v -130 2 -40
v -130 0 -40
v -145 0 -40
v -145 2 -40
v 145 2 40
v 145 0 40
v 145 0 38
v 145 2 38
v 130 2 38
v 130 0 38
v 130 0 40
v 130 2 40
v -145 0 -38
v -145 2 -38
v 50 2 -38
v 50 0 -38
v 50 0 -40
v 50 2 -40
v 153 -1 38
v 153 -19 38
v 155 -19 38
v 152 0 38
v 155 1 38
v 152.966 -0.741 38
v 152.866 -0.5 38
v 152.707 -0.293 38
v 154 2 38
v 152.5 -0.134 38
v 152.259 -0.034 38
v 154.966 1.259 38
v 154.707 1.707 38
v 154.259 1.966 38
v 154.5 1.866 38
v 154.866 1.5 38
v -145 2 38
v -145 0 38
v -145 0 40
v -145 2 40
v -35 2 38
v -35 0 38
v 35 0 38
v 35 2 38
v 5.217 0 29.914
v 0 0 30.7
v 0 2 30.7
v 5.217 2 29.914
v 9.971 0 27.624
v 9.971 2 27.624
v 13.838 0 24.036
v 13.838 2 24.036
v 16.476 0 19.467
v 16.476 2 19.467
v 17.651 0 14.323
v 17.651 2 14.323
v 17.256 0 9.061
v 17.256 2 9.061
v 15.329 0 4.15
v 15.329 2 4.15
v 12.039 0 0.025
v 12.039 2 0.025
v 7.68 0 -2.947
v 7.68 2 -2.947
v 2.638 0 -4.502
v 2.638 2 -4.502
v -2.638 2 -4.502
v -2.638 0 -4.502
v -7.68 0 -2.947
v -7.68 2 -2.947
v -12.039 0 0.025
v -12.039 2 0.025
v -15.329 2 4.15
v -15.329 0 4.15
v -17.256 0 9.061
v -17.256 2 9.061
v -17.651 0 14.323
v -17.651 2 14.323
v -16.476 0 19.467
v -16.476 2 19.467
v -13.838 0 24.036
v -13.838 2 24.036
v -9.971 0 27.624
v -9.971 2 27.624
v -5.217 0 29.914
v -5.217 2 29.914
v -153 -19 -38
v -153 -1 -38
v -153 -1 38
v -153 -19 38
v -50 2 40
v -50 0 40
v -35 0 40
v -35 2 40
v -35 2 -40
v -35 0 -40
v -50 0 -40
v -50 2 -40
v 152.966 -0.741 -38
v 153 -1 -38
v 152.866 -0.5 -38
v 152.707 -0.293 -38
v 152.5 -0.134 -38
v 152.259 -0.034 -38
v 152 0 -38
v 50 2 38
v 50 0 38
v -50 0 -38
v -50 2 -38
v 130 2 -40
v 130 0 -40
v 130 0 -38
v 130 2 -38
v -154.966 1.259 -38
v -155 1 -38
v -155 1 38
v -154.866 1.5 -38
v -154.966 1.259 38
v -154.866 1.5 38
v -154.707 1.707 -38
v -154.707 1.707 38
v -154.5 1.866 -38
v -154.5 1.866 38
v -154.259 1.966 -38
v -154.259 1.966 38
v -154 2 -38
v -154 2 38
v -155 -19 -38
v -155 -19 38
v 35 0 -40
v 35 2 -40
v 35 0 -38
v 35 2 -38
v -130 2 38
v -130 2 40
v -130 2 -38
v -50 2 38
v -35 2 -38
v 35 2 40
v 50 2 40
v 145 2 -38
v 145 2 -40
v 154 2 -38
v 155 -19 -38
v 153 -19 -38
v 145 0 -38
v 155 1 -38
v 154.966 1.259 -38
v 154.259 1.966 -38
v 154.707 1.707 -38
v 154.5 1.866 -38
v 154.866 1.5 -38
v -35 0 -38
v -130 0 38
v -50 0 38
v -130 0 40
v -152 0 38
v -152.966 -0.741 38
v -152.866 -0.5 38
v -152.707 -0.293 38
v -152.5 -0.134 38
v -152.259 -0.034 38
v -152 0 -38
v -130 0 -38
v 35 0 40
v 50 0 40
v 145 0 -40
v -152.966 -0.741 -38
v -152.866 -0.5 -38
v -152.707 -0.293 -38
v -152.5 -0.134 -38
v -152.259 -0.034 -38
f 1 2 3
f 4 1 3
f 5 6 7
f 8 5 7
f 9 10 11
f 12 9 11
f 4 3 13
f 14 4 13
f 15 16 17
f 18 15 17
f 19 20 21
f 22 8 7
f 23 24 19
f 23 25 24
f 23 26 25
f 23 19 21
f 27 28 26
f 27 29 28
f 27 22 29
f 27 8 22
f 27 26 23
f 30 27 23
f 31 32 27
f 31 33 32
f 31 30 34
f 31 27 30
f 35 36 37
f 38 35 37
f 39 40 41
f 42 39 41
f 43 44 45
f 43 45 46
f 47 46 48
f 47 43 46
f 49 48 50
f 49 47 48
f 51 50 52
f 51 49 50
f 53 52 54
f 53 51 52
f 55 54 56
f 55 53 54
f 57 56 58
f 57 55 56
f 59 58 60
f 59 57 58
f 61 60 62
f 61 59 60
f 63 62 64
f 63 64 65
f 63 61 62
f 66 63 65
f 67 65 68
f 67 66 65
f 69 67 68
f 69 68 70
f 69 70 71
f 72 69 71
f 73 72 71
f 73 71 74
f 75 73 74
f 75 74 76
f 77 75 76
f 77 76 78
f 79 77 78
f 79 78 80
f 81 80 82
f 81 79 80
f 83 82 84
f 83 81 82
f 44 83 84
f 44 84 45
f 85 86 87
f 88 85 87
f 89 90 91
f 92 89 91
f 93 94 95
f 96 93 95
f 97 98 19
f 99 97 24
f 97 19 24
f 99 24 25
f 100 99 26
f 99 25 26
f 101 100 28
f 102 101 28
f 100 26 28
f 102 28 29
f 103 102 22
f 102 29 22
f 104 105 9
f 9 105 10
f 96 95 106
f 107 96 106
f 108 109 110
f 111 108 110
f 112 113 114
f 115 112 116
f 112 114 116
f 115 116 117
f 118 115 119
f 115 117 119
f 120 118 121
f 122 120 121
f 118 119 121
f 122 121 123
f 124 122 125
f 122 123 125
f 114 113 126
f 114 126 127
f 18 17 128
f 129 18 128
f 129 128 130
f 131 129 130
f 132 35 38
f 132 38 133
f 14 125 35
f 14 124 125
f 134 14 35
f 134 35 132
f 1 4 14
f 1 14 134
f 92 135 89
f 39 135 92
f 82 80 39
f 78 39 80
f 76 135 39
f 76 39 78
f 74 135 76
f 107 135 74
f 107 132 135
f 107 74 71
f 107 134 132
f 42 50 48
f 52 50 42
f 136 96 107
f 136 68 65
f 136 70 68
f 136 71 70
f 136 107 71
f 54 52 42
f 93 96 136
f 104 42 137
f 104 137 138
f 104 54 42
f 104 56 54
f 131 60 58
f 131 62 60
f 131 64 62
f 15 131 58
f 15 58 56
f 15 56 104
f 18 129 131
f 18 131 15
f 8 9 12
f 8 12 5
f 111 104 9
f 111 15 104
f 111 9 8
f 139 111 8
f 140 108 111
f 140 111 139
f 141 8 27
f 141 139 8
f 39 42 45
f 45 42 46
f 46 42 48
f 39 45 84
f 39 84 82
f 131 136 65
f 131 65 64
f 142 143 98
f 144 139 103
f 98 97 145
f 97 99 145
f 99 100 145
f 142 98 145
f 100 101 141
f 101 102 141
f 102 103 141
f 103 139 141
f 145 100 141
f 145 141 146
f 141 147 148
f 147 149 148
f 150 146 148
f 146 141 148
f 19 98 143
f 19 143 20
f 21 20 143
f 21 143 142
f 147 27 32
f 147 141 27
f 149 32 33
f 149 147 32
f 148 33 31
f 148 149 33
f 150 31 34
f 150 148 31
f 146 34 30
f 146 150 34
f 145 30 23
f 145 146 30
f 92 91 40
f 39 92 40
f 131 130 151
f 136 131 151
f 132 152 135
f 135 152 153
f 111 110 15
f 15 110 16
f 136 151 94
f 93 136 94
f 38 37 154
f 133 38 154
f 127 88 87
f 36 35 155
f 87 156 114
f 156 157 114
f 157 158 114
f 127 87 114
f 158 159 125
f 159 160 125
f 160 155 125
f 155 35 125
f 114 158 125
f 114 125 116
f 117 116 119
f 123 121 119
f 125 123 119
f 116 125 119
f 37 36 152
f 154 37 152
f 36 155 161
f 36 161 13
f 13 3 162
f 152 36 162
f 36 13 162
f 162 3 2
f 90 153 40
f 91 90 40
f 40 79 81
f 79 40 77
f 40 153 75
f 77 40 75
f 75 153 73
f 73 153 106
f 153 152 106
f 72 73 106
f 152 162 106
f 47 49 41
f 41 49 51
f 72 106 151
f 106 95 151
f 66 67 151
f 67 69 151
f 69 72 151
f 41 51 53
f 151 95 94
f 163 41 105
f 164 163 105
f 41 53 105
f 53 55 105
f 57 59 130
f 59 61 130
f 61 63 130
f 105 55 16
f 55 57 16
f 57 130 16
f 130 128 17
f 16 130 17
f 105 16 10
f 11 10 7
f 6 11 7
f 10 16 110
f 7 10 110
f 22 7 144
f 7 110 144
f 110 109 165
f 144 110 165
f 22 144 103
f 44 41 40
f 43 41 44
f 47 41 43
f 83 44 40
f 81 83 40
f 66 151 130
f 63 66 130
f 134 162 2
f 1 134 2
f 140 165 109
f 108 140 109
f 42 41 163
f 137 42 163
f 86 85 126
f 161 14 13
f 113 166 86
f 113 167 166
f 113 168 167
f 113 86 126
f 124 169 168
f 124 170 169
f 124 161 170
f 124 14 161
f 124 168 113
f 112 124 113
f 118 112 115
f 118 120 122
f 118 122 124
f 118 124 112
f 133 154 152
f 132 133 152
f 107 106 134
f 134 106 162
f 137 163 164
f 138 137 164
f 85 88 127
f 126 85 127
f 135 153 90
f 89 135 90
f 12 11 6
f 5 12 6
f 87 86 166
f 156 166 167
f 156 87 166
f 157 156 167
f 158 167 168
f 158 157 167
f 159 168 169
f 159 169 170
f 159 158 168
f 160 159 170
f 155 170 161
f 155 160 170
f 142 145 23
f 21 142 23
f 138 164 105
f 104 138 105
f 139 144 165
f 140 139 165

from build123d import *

# Parameters (mm, degrees)
SKETCH_1_R      = 17.7
EXTRUDE_1_DEPTH = 2
SKETCH_2_W      = 2
SKETCH_2_H      = 76
EXTRUDE_2_DEPTH = 19
FILLET_1_R      = 1


with BuildPart() as part:
    # 草图1 → 凸台-拉伸1 (new body)
    with BuildSketch(Plane(origin=(0, 0, 0), x_dir=(1, 0, 0), z_dir=(0, 1, 0))):
        Polygon((-155, -38), (-145, -38), (-145, -40), (-130, -40), (-130, -38), (-50, -38), (-50, -40), (-35, -40), (-35, -38), (35, -38), (35, -40), (50, -40), (50, -38), (130, -38), (130, -40), (145, -40), (145, -38), (155, -38), (155, 38), (145, 38), (145, 40), (130, 40), (130, 38), (50, 38), (50, 40), (35, 40), (35, 38), (-35, 38), (-35, 40), (-50, 40), (-50, 38), (-130, 38), (-130, 40), (-145, 40), (-145, 38), (-155, 38), align=None)
        with Locations(Location((0, -13, 0), (0, 0, 270))):
            Circle(SKETCH_1_R, mode=Mode.SUBTRACT)
    extrude(amount=EXTRUDE_1_DEPTH)

    # 草图2 → 凸台-拉伸2 (add)
    with BuildSketch(Plane.XZ):
        with Locations((154, 0)):
            Rectangle(SKETCH_2_W, SKETCH_2_H)
    extrude_2 = extrude(amount=EXTRUDE_2_DEPTH)

    # 镜向1: 凸台-拉伸2 across plane
    add(extrude_2.mirror(Plane(origin=(0, 0, 0), x_dir=(0, 0, 1), z_dir=(1, 0, 0))))

    # 圆角1
    fillet_1_edges = [part.edges().sort_by_distance(p)[0] for p in [
        (153, 0, 0),
        (155, 2, 0),
        (-153, 0, 0),
        (-155, 2, 0),
    ]]
    fillet(fillet_1_edges, radius=FILLET_1_R)


solid = part.part
